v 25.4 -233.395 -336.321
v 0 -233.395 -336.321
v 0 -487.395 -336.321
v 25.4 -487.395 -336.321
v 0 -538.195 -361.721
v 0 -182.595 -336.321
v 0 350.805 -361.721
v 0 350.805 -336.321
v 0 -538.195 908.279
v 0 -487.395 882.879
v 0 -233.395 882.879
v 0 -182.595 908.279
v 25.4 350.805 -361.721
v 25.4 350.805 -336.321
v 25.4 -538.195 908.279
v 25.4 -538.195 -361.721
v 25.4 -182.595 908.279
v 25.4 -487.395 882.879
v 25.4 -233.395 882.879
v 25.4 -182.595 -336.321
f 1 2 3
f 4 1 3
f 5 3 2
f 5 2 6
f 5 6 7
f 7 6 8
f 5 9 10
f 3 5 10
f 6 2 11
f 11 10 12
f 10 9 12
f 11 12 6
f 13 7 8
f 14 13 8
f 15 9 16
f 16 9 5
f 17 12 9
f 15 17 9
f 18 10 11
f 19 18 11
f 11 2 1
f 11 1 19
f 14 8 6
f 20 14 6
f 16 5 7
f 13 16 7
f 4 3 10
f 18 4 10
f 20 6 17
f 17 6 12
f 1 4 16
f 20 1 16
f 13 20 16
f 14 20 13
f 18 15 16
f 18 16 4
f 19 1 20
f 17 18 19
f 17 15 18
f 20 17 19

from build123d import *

# Parameters (mm, degrees)
F0_W     = 50.8
F0_H     = 1219.2
F1_DEPTH = 25.4


with BuildPart() as f1:
    # F0 (on Right) → F1 (new body)
    with BuildSketch(Plane.YZ):
        Polygon((350.804755, -361.721163), (350.804755, -336.321163), (-182.595245, -336.321163), (-233.395245, -336.321163), (-487.395245, -336.321163), (-538.195245, -336.321163), (-538.195245, -361.721163), align=None)
        with Locations((-207.995245, 273.278837)):
            Rectangle(F0_W, F0_H)
        Polygon((-233.395245, 882.878837), (-182.595245, 882.878837), (-182.595245, 908.278837), (-538.195245, 908.278837), (-538.195245, 882.878837), (-487.395245, 882.878837), align=None)
        with Locations((-512.795245, 273.278837)):
            Rectangle(F0_W, F0_H)
    extrude(amount=F1_DEPTH)


solid = f1.part
